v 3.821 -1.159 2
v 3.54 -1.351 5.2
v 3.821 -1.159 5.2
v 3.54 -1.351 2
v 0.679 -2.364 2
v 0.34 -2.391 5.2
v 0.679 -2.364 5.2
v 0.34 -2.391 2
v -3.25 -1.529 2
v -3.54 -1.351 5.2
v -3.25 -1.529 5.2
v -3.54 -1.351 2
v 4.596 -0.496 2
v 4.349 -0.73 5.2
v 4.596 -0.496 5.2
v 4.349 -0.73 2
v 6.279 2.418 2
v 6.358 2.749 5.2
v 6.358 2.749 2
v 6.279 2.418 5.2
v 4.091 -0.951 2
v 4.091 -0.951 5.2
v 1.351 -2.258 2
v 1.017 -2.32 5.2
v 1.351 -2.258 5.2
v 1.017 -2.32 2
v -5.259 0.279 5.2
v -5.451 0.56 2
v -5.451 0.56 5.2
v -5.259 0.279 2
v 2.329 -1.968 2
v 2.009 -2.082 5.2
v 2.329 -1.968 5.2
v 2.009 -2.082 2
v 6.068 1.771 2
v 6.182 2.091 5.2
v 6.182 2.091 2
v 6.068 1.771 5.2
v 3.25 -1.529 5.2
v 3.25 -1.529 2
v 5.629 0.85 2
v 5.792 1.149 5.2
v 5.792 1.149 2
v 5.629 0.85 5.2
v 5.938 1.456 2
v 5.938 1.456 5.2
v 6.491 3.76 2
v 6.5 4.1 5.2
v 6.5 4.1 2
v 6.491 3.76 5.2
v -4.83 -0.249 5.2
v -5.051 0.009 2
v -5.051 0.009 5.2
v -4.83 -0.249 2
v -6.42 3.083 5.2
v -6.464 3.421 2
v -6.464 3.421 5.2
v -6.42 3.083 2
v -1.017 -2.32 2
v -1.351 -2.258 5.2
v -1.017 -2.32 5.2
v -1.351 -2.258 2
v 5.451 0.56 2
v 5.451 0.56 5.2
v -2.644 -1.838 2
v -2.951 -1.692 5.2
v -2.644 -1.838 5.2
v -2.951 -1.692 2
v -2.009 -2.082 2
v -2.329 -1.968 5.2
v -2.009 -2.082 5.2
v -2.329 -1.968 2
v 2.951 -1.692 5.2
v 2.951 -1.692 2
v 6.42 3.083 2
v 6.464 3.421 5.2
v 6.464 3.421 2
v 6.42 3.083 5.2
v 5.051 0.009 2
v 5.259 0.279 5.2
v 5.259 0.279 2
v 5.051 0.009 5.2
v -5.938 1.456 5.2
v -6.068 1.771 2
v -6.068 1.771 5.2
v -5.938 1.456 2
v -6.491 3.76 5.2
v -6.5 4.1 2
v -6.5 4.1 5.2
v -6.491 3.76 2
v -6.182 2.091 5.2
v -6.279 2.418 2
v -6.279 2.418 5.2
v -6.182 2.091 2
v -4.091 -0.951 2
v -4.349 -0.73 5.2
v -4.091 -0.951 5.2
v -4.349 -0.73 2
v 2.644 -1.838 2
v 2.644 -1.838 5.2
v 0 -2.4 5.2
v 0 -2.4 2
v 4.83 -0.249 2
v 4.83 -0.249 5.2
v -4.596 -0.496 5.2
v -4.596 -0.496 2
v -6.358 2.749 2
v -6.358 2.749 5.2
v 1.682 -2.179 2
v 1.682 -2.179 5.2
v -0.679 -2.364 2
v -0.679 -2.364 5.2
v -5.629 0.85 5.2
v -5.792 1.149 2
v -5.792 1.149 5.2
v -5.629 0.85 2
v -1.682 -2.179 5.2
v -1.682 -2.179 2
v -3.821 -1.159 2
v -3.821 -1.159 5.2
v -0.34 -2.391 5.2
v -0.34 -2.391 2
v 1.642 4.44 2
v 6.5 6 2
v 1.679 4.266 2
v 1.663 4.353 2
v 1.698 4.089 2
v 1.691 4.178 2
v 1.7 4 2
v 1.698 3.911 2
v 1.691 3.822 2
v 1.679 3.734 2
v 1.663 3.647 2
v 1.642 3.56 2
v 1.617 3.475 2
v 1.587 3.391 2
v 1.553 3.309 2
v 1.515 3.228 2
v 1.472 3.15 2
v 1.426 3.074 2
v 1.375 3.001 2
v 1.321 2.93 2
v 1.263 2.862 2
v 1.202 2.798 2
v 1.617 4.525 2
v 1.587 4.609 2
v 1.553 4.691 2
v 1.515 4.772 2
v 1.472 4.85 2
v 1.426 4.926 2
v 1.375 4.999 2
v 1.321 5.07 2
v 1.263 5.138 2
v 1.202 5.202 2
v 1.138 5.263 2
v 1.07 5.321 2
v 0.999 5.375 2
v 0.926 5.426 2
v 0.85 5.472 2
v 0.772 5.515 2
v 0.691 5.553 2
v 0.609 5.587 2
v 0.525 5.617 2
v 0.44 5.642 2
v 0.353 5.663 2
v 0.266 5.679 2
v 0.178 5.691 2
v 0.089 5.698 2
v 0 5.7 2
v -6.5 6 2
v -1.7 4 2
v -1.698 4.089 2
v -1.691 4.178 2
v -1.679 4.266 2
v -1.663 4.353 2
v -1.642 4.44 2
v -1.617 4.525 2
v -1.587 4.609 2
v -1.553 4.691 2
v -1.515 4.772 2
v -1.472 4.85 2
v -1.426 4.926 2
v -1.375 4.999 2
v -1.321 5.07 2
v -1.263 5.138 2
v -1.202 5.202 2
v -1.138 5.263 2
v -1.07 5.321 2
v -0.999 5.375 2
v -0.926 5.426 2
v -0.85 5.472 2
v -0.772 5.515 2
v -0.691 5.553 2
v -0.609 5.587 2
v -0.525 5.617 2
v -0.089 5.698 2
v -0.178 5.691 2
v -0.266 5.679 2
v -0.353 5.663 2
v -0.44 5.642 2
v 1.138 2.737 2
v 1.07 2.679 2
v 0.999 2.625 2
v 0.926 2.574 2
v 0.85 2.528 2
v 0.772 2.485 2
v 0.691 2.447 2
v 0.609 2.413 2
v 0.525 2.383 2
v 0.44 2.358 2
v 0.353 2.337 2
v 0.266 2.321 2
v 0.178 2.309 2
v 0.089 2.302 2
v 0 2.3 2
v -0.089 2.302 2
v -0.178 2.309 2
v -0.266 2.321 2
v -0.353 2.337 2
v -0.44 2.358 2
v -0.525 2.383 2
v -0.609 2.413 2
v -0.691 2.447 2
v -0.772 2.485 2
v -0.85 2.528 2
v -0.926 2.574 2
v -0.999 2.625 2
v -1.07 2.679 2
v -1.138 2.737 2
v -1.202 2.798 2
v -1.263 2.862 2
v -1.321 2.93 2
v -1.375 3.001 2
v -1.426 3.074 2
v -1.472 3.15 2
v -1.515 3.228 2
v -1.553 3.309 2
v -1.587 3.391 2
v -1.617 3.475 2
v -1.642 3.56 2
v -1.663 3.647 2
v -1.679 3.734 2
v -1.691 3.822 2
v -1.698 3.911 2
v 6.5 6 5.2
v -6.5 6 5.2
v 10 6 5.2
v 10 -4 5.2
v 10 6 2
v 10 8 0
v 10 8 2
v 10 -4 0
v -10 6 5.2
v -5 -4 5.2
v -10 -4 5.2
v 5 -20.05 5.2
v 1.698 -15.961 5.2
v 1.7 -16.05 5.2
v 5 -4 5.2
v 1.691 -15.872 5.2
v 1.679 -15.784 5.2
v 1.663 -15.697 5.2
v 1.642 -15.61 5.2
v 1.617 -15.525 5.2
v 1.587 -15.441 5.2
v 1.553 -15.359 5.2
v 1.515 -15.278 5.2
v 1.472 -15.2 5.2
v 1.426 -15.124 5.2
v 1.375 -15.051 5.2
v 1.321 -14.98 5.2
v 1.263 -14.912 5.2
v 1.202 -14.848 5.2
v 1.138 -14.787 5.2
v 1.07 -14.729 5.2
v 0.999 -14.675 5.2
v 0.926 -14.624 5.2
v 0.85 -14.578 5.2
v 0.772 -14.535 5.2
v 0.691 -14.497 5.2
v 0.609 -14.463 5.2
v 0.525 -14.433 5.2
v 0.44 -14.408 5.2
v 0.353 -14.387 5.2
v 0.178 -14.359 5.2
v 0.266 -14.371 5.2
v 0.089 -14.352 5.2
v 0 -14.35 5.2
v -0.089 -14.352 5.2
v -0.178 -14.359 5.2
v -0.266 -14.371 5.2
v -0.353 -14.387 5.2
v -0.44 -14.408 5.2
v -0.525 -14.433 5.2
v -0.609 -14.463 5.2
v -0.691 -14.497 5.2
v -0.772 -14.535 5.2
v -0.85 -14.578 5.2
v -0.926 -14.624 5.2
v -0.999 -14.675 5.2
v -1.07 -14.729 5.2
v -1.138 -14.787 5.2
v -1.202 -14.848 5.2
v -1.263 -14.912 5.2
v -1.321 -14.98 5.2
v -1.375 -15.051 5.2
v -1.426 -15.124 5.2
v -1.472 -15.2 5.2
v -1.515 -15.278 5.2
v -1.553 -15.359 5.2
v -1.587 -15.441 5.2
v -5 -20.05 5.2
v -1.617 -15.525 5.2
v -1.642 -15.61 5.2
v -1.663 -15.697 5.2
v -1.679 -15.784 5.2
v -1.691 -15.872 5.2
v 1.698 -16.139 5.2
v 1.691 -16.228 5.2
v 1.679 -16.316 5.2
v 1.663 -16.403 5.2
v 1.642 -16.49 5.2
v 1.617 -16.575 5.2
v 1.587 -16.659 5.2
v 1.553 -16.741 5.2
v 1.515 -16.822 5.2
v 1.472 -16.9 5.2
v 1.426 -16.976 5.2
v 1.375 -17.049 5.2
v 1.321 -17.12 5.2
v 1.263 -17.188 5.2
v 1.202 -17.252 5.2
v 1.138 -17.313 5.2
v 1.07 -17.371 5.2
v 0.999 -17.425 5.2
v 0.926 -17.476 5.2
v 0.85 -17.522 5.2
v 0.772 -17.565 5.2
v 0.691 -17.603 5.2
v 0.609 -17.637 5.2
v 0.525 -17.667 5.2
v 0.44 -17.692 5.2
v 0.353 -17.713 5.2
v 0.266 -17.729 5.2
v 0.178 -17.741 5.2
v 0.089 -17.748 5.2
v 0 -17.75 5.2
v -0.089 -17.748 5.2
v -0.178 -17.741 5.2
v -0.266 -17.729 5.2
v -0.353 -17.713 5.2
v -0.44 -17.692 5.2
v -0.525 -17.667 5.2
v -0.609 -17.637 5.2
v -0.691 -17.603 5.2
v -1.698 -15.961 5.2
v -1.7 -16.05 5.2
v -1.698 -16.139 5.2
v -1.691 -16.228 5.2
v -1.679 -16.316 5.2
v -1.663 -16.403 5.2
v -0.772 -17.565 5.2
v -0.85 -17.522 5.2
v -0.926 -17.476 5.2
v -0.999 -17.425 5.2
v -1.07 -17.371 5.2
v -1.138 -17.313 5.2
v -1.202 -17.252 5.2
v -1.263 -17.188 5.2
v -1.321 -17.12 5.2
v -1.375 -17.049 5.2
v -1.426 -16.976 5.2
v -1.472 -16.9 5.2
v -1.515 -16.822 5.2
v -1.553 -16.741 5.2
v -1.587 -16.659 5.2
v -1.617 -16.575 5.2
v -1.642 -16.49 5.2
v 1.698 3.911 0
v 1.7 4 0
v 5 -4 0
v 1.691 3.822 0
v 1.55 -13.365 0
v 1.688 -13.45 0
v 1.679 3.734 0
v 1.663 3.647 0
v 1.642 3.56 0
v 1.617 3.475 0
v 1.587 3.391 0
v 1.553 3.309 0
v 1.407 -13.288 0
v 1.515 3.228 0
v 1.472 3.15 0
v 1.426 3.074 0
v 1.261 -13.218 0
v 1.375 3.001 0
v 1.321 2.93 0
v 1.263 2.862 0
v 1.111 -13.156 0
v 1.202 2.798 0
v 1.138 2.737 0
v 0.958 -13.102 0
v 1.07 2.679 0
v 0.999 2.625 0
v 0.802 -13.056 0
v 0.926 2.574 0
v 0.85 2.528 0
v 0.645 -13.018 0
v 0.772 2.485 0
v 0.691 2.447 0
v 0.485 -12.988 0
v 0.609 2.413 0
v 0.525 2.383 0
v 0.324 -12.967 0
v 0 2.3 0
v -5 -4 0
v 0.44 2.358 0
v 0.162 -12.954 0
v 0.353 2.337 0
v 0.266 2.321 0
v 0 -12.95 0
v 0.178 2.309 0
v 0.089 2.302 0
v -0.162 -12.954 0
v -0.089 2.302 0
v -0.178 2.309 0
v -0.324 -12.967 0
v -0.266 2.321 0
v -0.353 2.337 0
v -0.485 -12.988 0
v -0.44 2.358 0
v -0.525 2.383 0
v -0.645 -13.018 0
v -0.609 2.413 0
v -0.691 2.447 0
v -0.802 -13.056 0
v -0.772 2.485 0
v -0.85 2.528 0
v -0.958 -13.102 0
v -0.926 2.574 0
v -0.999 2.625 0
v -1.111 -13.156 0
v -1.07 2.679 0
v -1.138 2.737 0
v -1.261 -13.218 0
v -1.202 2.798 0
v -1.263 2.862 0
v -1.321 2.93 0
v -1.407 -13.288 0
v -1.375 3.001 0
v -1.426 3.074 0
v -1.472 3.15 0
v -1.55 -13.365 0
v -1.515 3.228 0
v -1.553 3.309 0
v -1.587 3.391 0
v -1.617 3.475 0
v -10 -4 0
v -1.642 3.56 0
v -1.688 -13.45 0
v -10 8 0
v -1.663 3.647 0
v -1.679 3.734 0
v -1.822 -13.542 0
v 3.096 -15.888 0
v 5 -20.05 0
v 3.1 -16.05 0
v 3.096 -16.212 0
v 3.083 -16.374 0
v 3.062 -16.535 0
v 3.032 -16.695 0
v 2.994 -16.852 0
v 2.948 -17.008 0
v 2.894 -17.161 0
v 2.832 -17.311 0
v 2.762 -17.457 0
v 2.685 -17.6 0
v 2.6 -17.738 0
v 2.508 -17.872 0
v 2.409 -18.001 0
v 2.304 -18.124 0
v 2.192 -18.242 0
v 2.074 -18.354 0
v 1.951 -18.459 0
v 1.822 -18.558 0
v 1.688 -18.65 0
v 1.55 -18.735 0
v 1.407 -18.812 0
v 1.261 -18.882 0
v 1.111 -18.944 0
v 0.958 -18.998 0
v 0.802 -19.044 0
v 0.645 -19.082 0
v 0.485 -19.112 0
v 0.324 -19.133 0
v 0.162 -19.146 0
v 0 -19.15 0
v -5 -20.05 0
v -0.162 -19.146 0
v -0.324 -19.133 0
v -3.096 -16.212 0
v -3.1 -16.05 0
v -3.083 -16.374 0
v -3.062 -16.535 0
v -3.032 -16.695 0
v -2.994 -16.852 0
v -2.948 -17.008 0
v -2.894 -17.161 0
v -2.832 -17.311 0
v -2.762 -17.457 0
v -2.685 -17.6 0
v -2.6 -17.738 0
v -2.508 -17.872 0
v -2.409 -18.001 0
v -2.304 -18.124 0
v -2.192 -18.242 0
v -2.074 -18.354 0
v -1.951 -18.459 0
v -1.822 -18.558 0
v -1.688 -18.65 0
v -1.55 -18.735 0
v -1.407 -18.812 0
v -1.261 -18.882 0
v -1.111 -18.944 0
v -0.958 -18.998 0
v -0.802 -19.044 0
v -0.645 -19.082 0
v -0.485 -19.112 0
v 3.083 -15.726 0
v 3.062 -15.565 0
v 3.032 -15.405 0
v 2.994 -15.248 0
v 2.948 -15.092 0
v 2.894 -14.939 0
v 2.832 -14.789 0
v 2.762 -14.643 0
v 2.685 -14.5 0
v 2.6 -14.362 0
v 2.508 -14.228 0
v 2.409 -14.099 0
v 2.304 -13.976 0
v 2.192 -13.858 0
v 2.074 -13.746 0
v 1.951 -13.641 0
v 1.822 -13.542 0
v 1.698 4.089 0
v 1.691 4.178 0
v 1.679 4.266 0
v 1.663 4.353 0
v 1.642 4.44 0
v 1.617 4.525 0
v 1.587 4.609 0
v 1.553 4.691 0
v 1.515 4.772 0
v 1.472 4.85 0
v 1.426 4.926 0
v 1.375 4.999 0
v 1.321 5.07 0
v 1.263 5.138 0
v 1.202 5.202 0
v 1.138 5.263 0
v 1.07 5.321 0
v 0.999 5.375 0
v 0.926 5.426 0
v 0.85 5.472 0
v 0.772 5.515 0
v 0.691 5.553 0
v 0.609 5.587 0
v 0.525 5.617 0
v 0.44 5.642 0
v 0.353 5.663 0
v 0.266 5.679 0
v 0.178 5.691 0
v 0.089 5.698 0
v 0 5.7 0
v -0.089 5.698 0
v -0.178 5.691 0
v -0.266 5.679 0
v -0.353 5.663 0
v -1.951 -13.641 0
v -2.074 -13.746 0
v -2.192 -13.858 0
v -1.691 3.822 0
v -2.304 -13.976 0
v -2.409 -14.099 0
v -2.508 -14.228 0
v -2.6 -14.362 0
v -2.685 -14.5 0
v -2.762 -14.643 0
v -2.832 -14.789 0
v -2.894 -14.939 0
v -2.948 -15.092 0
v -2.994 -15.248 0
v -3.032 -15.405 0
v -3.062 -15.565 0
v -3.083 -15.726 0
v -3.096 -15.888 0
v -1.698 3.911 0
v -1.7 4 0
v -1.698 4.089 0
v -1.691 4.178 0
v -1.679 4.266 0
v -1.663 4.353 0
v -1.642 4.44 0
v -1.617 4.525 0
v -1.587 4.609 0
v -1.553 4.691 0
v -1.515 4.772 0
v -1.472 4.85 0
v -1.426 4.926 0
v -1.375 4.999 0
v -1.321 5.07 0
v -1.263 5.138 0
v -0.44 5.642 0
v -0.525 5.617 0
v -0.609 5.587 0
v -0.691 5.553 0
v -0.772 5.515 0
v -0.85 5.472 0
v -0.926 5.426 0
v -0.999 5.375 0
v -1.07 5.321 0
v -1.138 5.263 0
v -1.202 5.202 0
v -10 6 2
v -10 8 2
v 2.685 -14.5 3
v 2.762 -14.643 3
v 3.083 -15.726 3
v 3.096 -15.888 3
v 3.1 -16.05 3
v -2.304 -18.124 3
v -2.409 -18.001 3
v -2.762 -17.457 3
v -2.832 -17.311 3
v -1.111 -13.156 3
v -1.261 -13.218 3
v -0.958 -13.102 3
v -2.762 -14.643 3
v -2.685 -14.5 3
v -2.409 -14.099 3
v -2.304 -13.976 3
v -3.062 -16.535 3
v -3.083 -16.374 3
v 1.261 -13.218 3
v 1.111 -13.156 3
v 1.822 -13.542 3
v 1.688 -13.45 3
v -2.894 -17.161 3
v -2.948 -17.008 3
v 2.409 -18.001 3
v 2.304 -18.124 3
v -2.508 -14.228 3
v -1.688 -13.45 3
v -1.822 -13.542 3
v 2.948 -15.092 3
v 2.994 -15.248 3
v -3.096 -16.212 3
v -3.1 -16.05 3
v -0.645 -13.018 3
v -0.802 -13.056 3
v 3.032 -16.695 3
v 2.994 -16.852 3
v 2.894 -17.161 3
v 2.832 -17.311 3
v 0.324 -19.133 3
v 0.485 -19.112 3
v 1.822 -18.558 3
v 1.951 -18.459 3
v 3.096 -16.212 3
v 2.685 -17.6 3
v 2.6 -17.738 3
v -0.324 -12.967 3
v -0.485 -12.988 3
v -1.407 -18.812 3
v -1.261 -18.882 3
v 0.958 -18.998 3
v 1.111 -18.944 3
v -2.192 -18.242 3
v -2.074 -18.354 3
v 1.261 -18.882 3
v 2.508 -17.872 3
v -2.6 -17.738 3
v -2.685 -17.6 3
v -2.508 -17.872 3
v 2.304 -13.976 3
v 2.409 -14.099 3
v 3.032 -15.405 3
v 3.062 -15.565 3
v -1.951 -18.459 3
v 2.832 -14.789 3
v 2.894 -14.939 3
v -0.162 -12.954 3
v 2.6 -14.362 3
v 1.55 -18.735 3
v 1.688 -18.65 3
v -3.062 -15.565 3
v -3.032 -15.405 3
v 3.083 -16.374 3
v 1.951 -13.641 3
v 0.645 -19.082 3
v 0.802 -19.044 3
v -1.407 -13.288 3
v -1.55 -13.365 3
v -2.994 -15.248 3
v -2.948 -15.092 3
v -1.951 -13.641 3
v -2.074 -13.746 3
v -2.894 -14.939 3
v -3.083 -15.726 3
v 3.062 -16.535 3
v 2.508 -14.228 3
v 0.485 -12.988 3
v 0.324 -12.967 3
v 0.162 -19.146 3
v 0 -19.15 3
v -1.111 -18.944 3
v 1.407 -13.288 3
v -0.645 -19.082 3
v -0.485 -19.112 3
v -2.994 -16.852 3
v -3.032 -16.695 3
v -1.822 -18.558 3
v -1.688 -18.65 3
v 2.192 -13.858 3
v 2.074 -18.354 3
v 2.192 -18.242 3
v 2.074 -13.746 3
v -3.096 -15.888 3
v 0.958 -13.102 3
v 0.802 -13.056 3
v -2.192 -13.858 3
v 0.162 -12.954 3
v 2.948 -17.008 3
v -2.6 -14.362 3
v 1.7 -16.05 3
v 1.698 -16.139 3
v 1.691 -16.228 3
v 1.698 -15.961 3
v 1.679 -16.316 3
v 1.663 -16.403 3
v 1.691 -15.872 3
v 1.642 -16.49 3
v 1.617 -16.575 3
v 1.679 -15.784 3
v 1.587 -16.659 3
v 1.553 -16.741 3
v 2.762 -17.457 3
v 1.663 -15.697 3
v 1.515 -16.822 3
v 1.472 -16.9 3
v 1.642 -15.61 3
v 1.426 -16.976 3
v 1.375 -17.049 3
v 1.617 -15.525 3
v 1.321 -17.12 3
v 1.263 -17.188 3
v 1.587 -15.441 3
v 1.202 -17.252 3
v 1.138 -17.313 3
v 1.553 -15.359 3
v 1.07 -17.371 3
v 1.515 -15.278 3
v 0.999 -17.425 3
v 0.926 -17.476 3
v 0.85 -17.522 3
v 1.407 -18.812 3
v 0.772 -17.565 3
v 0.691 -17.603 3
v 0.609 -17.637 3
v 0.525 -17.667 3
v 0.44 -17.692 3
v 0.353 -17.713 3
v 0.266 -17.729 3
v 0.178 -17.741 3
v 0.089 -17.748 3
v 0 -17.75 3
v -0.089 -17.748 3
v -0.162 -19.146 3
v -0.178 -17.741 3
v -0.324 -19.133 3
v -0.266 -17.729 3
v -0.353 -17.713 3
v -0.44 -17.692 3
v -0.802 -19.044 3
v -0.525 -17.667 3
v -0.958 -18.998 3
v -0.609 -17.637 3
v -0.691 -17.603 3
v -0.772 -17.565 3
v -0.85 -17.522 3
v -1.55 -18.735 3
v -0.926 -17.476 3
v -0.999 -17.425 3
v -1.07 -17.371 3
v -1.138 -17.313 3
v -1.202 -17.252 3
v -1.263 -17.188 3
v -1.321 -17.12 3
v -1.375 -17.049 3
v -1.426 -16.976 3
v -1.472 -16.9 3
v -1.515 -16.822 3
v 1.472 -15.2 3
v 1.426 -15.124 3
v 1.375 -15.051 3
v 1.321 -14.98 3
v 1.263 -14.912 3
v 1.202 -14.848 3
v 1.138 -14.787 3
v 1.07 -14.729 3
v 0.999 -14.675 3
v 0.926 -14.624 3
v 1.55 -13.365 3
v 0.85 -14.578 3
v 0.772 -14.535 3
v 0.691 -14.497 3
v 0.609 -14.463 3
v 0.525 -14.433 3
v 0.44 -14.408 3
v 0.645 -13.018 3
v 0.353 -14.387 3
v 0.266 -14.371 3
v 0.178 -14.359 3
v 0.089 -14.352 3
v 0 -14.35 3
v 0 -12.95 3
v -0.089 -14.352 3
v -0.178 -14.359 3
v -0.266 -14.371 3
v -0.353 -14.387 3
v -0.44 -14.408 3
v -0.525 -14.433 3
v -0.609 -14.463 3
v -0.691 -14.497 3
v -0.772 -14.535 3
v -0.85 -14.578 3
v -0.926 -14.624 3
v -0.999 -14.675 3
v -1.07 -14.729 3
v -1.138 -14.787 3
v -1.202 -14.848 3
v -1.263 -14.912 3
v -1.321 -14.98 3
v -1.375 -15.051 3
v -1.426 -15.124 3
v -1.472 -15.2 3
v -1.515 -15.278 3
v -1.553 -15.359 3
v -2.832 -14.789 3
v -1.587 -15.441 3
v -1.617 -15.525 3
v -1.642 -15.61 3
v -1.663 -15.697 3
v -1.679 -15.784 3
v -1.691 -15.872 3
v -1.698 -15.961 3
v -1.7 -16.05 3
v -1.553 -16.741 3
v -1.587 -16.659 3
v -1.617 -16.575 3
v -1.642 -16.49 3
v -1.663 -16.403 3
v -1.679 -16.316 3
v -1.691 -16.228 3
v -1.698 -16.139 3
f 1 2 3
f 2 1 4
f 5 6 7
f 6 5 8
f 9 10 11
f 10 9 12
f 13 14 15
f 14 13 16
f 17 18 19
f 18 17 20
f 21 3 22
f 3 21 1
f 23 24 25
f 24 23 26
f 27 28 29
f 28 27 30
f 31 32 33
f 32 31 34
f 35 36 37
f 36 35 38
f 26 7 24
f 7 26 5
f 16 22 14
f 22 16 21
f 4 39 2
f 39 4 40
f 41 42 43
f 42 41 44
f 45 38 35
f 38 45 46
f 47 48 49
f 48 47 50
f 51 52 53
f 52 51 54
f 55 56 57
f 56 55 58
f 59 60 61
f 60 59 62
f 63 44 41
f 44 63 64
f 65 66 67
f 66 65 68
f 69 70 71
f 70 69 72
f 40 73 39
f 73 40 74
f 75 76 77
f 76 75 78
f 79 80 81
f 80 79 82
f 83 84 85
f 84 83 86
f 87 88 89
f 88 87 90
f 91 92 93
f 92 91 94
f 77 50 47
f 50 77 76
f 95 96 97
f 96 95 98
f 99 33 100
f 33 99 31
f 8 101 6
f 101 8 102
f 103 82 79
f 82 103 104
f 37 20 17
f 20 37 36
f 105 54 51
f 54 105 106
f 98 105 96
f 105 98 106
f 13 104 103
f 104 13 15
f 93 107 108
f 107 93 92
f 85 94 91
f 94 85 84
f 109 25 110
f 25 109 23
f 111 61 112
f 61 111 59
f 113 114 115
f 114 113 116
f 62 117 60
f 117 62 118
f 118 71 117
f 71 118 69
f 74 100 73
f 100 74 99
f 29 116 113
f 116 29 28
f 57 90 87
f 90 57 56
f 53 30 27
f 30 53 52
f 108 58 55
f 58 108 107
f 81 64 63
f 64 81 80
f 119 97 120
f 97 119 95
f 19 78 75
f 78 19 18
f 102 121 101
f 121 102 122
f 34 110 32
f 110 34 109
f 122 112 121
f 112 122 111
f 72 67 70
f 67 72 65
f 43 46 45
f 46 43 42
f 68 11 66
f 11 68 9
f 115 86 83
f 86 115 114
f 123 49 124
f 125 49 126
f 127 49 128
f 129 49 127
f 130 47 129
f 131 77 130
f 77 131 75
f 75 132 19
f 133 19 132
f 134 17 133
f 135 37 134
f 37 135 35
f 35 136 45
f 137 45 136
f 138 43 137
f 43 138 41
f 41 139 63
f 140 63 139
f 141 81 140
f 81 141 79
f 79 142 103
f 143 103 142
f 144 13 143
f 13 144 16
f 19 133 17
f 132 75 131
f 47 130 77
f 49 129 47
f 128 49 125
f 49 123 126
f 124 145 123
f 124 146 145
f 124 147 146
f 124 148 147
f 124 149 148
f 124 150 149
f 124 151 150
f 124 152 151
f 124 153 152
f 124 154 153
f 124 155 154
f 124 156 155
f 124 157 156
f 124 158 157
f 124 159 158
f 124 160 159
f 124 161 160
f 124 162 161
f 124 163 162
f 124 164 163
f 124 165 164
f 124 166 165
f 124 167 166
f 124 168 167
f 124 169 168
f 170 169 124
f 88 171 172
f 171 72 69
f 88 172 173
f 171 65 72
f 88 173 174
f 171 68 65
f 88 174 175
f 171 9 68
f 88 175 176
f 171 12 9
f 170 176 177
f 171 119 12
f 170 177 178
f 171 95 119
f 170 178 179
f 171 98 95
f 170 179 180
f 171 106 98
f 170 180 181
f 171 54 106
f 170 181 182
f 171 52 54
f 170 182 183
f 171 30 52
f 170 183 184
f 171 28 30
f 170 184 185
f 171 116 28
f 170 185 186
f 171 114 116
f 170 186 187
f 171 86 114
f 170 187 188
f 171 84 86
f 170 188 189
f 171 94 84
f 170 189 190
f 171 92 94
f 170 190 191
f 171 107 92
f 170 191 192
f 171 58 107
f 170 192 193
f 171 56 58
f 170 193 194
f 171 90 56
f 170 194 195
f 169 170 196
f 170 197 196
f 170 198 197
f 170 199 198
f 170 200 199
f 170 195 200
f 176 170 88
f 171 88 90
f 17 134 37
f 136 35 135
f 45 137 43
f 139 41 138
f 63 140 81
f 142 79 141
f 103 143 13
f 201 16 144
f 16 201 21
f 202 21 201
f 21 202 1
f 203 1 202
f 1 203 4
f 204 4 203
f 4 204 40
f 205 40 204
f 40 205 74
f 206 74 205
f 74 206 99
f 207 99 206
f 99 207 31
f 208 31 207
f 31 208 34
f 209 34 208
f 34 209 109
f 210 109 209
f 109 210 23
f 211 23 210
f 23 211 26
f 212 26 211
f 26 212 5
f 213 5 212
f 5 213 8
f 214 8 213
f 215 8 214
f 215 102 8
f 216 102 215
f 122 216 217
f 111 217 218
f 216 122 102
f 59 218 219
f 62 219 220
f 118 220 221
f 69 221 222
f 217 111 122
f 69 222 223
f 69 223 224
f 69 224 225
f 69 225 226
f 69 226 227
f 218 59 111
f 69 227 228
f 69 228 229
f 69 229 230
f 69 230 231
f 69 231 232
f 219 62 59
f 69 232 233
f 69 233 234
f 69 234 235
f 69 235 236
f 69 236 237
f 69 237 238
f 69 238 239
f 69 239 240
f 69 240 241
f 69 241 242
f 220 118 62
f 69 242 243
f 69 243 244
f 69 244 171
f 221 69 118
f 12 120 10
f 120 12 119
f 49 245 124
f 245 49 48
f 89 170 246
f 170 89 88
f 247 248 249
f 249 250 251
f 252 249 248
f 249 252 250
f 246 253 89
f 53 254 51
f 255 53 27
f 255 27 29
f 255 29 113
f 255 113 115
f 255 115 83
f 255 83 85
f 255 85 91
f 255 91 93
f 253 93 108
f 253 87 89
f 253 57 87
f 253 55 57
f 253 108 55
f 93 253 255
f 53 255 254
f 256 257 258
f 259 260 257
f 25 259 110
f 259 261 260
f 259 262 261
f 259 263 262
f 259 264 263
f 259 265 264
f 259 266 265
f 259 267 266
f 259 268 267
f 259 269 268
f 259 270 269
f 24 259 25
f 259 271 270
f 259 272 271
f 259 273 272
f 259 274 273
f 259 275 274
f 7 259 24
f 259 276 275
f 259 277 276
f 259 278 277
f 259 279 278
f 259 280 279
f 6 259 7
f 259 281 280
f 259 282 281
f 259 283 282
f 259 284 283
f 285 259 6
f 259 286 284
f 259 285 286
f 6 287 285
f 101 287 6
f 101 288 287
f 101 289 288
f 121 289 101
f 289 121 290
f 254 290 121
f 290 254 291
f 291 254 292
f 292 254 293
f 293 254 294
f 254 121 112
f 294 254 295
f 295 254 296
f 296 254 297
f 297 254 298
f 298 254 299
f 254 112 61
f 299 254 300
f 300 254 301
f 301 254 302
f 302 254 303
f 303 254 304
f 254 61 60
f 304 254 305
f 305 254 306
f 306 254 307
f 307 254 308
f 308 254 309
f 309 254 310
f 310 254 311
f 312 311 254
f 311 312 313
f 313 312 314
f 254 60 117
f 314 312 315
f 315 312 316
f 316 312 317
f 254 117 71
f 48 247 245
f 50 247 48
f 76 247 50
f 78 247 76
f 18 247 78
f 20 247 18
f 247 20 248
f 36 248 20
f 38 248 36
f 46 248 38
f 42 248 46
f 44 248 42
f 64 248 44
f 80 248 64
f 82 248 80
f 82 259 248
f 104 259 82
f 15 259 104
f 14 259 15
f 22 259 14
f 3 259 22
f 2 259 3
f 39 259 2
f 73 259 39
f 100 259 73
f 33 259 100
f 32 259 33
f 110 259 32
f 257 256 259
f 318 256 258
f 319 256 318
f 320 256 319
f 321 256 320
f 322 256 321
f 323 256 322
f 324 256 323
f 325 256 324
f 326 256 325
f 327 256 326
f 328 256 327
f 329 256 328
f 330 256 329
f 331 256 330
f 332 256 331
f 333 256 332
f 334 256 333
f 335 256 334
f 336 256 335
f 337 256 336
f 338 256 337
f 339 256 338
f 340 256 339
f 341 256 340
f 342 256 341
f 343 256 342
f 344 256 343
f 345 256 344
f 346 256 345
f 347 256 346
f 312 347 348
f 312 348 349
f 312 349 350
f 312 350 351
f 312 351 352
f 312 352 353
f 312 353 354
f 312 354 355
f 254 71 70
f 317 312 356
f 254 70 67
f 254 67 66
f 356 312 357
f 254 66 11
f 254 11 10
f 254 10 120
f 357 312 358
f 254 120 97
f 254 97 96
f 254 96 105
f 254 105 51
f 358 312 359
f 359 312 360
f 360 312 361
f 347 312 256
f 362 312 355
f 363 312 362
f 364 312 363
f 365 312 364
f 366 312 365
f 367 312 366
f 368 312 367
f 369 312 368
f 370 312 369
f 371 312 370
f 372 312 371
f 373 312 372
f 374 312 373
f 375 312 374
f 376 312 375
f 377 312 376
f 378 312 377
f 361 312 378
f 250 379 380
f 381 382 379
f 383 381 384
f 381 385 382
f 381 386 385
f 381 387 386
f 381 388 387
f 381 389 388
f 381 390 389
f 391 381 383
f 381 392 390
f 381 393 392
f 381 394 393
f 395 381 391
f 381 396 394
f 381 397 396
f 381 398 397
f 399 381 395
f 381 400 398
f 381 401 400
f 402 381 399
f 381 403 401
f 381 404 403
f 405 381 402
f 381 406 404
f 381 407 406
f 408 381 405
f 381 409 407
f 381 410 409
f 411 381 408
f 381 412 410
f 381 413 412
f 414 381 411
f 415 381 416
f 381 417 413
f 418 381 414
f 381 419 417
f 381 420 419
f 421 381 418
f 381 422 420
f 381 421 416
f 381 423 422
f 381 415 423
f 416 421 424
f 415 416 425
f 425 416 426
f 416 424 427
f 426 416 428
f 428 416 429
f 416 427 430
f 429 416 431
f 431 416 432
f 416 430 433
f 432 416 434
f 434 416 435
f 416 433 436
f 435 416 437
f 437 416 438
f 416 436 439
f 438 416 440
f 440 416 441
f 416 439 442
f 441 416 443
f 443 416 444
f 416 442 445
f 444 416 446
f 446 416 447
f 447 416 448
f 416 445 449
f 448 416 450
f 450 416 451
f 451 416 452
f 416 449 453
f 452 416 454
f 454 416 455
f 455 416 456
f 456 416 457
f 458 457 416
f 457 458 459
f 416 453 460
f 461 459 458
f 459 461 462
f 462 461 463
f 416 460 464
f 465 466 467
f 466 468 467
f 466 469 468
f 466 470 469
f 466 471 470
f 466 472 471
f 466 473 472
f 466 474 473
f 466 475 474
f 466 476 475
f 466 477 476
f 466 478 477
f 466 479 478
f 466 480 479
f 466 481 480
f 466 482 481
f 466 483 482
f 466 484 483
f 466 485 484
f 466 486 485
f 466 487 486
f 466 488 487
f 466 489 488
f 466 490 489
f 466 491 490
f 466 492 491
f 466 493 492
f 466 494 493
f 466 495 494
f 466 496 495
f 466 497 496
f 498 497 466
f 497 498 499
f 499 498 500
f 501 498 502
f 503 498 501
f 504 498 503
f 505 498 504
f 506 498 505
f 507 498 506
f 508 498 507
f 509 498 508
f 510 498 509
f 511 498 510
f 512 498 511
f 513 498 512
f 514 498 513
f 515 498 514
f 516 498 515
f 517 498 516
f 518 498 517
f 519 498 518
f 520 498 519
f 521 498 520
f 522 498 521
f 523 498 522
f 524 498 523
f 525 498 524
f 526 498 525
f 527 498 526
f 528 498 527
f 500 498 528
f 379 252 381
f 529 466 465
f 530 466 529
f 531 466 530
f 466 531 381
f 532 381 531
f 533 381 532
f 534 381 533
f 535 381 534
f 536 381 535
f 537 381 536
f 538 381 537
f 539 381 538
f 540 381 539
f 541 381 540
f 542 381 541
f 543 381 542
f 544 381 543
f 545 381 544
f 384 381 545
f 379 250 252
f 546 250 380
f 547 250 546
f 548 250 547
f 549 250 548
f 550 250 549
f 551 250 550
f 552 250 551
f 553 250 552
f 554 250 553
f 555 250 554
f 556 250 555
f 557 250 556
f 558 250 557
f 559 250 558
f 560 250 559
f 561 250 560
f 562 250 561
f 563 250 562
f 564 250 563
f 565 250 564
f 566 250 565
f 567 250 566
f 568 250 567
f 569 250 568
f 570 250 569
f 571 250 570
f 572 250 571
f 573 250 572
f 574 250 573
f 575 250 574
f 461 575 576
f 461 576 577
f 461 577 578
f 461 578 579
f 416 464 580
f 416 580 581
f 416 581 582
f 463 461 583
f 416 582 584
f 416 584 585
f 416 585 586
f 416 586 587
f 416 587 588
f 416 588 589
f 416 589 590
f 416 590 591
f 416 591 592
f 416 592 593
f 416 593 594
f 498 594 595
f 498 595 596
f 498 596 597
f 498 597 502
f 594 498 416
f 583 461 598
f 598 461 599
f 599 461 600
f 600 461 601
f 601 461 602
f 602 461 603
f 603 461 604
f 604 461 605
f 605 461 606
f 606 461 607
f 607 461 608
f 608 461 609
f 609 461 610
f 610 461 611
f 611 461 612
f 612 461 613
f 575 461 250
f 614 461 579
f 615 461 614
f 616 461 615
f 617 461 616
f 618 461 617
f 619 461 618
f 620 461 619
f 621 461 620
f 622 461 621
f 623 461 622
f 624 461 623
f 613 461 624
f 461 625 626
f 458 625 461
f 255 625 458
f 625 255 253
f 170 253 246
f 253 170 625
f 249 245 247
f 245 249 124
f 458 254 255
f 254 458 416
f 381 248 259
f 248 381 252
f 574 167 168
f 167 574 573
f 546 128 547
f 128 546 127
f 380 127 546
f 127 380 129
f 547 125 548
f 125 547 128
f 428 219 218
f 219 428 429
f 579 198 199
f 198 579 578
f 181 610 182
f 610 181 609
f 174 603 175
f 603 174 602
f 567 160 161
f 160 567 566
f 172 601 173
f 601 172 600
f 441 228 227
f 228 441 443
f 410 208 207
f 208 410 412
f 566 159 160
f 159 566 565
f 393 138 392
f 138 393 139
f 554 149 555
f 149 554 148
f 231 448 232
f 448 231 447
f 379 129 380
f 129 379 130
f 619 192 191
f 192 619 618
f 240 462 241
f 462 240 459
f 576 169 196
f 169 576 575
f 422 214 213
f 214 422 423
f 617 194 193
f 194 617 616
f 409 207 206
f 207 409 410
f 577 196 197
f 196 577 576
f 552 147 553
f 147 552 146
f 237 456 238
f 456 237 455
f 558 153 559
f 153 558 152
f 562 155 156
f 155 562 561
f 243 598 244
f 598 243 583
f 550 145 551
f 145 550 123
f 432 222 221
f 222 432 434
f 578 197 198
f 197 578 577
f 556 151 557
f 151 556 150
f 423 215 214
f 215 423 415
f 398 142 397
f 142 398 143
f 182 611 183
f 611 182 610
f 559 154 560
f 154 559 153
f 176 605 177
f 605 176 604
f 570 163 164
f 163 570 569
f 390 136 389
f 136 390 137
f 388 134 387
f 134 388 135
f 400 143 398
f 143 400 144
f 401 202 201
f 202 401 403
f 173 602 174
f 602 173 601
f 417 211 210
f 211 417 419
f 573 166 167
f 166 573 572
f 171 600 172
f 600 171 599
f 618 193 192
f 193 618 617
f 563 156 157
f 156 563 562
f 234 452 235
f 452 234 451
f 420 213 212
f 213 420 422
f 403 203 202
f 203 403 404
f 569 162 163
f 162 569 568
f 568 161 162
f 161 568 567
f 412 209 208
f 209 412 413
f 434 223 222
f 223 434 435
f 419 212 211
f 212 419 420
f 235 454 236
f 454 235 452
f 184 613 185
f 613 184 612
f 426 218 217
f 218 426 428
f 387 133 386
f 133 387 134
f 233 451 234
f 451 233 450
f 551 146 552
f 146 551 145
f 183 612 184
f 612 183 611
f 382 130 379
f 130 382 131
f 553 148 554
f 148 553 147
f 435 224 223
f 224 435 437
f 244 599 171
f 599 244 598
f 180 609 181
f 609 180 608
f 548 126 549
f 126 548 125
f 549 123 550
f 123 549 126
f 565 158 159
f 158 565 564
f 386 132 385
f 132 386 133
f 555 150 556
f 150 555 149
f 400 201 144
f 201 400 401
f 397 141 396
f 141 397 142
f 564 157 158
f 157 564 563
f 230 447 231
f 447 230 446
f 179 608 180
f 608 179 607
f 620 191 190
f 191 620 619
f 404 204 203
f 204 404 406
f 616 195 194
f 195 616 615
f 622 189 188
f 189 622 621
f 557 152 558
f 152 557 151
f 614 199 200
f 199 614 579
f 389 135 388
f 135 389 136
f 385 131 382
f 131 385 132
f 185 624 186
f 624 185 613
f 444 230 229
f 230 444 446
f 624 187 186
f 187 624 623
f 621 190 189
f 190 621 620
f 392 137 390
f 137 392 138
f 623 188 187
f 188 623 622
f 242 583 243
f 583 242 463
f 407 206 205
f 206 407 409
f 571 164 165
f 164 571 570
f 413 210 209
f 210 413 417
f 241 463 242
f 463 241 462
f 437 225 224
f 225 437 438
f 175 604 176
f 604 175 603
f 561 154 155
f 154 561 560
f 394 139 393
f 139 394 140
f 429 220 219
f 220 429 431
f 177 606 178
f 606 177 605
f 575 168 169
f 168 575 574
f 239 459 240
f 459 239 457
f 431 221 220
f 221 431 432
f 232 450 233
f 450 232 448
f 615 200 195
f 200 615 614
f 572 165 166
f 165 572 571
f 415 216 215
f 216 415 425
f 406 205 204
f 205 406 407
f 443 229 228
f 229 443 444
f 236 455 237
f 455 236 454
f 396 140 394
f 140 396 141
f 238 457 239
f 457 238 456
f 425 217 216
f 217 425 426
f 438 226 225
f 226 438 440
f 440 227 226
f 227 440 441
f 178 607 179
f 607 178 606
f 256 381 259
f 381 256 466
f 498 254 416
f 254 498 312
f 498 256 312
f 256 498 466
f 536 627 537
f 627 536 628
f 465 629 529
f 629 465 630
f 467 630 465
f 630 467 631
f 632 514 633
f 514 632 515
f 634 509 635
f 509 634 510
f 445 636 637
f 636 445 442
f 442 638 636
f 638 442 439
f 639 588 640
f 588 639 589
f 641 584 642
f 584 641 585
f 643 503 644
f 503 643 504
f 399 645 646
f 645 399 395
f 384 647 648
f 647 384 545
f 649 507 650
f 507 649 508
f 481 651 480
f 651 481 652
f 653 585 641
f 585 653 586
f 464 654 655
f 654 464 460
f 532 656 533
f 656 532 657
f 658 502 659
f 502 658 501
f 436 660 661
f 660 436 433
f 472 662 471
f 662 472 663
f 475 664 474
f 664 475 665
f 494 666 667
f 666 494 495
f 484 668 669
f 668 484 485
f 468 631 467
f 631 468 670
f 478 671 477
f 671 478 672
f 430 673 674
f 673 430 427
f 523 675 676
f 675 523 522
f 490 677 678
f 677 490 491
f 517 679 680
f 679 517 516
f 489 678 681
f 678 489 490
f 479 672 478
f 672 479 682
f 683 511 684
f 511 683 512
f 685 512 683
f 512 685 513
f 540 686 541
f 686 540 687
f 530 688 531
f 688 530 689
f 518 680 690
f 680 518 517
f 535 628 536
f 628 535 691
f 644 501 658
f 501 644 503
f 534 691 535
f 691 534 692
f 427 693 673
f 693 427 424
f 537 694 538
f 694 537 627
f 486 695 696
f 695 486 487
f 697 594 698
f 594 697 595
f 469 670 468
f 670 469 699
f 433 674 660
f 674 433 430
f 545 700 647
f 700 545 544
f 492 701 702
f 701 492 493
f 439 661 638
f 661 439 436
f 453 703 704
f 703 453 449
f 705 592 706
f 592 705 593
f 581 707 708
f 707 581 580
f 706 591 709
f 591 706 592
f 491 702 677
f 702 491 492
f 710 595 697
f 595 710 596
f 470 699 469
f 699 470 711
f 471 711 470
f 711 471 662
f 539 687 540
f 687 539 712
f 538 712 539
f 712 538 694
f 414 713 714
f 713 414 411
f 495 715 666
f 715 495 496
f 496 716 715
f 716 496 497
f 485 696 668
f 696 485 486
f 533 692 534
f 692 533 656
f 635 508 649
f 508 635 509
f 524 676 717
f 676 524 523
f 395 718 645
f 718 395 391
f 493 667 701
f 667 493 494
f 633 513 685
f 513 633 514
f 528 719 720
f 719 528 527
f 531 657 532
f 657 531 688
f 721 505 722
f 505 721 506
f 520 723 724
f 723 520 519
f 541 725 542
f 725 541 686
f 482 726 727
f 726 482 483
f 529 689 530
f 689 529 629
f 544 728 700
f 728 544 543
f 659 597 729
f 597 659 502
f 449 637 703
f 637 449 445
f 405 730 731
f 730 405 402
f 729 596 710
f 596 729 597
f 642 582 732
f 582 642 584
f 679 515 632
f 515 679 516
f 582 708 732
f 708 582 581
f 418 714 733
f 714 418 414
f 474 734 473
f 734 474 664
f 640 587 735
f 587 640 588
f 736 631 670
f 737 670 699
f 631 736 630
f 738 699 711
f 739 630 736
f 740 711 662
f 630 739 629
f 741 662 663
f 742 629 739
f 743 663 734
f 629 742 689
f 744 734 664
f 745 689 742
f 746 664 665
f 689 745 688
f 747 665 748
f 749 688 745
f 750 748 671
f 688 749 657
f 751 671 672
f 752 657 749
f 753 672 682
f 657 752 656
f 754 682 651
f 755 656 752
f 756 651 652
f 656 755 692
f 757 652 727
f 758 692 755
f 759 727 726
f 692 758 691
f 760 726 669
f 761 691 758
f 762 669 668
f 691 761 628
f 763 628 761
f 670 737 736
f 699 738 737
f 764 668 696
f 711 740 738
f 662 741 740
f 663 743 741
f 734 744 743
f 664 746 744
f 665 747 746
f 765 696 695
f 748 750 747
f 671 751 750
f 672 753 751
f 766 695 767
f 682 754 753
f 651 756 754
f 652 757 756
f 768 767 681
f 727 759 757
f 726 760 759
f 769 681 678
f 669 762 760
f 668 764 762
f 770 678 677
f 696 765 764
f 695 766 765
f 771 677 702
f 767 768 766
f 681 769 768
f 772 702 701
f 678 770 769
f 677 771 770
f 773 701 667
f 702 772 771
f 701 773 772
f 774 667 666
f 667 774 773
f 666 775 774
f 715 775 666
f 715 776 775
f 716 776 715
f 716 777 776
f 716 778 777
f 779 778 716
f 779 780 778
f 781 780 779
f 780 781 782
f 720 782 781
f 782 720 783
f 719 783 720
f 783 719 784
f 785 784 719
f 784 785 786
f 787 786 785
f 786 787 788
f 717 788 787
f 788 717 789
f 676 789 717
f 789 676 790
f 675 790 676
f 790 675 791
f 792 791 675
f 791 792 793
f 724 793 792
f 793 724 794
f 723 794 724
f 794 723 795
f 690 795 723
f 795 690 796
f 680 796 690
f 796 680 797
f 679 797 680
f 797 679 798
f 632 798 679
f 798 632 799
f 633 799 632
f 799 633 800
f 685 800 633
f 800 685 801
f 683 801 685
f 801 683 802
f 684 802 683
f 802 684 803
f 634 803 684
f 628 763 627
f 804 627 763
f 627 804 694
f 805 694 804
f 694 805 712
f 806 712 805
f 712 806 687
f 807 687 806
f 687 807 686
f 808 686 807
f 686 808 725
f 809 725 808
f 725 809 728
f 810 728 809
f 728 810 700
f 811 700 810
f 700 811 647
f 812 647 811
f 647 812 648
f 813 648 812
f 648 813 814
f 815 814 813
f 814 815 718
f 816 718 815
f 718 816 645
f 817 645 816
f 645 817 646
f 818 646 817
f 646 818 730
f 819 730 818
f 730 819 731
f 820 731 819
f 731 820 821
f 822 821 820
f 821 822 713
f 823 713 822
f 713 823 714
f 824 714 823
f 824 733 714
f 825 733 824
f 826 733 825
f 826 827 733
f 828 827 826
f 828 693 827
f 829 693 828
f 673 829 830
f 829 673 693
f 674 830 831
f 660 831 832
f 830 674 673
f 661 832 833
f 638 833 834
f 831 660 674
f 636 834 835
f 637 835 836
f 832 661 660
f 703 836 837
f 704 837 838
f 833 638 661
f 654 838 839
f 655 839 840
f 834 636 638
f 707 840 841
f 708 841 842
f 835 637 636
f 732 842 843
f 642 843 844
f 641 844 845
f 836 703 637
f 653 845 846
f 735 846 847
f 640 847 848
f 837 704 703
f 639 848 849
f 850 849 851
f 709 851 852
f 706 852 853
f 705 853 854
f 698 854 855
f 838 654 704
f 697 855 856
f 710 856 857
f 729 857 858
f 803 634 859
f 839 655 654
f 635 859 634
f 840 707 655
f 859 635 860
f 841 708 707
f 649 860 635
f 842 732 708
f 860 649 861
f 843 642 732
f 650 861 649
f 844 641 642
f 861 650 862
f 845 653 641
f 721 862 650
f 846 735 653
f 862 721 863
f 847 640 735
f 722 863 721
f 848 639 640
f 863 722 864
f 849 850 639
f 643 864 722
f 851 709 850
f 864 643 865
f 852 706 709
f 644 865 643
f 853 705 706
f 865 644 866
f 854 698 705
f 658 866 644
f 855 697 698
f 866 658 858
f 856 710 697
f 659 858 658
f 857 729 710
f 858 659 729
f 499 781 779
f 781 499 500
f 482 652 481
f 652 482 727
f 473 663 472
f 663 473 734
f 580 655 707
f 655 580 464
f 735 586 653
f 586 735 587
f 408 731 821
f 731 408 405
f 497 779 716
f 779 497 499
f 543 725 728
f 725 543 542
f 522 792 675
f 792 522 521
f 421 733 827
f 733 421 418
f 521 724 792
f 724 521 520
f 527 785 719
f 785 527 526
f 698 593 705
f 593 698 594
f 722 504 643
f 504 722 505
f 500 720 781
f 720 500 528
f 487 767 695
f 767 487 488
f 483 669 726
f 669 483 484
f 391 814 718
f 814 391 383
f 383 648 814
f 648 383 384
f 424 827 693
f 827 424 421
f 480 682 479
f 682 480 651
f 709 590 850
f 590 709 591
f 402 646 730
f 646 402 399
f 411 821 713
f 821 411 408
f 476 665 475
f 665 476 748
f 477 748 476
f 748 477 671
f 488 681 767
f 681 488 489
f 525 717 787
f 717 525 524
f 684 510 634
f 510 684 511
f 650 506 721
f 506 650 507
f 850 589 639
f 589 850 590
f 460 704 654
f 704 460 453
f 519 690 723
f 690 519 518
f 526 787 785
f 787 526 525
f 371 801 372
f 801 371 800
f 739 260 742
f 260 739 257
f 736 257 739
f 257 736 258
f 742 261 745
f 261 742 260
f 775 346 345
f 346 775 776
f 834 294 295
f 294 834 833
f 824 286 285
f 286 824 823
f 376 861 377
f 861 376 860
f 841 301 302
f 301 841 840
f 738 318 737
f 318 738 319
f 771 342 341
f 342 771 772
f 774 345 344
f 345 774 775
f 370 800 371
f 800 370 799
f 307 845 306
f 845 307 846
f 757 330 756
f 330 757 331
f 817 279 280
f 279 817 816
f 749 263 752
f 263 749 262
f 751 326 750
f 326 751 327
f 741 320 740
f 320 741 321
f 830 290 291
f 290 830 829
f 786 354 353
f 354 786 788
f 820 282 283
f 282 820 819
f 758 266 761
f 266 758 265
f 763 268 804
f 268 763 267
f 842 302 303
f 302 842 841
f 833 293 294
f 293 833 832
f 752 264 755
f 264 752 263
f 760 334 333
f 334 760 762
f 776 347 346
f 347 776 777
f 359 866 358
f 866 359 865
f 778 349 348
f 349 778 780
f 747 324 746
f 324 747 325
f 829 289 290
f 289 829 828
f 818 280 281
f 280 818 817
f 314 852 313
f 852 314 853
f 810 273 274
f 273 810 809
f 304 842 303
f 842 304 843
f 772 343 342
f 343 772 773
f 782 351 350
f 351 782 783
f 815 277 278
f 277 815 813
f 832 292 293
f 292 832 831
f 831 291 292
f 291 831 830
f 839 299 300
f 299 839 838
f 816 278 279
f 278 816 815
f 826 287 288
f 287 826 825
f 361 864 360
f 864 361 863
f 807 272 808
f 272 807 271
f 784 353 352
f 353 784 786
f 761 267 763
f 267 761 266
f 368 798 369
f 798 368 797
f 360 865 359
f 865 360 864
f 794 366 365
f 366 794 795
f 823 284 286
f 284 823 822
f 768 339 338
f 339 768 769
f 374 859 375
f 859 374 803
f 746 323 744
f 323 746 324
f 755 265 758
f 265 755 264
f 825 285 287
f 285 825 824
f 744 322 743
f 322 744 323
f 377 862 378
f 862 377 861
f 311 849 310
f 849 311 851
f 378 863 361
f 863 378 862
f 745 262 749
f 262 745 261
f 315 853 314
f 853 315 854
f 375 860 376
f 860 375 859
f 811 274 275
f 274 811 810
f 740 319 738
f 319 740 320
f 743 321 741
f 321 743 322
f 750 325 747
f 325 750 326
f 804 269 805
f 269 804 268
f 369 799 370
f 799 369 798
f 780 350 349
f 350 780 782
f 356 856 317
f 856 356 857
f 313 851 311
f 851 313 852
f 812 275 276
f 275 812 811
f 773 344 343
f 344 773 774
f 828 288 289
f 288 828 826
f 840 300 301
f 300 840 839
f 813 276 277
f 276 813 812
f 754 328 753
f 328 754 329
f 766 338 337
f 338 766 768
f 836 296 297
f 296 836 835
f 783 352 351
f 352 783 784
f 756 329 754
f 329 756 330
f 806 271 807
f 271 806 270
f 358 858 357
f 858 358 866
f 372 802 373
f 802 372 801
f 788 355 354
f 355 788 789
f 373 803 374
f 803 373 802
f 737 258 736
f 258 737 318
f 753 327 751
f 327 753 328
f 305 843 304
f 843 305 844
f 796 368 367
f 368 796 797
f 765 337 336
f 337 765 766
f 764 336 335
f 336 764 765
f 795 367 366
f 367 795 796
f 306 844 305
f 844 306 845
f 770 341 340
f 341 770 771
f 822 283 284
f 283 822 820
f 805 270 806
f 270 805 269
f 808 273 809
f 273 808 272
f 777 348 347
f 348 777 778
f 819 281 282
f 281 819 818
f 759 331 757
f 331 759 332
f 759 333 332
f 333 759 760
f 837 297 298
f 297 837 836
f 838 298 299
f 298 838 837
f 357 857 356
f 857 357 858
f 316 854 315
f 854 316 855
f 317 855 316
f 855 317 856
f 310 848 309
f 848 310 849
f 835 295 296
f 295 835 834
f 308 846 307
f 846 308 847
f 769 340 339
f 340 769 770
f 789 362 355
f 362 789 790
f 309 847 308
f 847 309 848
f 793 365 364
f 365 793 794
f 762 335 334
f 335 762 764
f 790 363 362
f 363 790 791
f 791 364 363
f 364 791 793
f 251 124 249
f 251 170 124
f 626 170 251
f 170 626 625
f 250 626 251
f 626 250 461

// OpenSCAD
// Real Lonely T-Rex Game: Wall Mount
// Copyright (C) 2017, Uri Shaked and Ariella Eliassaf

$fn=120;

width = 5.2;
wall_width = 3.2;

difference() {
    translate([-10,-4,0])
    cube([20,10,width]);
    
    translate([0,4.1,width-wall_width])
    union() {
       cylinder(h=wall_width+1, r=6.5);

       translate([-6.5,0,0])
       cube([6.5*2,6.5,wall_width+1]);
        
    }
    
    translate([0,4,-0.5])
    cylinder(h=3+1, r=1.7);
}


translate([-10,6,0])
    cube([20,2,width-wall_width]);

difference() {
    translate([-5,-18-4.1/2,0])
    cube([10,17,width]);

    translate([0,-14-4.1/2,0])
    cylinder(h=3,r=3.1);

    translate([0,-14-4.1/2,3])
    cylinder(h=4,r=1.7);

}
